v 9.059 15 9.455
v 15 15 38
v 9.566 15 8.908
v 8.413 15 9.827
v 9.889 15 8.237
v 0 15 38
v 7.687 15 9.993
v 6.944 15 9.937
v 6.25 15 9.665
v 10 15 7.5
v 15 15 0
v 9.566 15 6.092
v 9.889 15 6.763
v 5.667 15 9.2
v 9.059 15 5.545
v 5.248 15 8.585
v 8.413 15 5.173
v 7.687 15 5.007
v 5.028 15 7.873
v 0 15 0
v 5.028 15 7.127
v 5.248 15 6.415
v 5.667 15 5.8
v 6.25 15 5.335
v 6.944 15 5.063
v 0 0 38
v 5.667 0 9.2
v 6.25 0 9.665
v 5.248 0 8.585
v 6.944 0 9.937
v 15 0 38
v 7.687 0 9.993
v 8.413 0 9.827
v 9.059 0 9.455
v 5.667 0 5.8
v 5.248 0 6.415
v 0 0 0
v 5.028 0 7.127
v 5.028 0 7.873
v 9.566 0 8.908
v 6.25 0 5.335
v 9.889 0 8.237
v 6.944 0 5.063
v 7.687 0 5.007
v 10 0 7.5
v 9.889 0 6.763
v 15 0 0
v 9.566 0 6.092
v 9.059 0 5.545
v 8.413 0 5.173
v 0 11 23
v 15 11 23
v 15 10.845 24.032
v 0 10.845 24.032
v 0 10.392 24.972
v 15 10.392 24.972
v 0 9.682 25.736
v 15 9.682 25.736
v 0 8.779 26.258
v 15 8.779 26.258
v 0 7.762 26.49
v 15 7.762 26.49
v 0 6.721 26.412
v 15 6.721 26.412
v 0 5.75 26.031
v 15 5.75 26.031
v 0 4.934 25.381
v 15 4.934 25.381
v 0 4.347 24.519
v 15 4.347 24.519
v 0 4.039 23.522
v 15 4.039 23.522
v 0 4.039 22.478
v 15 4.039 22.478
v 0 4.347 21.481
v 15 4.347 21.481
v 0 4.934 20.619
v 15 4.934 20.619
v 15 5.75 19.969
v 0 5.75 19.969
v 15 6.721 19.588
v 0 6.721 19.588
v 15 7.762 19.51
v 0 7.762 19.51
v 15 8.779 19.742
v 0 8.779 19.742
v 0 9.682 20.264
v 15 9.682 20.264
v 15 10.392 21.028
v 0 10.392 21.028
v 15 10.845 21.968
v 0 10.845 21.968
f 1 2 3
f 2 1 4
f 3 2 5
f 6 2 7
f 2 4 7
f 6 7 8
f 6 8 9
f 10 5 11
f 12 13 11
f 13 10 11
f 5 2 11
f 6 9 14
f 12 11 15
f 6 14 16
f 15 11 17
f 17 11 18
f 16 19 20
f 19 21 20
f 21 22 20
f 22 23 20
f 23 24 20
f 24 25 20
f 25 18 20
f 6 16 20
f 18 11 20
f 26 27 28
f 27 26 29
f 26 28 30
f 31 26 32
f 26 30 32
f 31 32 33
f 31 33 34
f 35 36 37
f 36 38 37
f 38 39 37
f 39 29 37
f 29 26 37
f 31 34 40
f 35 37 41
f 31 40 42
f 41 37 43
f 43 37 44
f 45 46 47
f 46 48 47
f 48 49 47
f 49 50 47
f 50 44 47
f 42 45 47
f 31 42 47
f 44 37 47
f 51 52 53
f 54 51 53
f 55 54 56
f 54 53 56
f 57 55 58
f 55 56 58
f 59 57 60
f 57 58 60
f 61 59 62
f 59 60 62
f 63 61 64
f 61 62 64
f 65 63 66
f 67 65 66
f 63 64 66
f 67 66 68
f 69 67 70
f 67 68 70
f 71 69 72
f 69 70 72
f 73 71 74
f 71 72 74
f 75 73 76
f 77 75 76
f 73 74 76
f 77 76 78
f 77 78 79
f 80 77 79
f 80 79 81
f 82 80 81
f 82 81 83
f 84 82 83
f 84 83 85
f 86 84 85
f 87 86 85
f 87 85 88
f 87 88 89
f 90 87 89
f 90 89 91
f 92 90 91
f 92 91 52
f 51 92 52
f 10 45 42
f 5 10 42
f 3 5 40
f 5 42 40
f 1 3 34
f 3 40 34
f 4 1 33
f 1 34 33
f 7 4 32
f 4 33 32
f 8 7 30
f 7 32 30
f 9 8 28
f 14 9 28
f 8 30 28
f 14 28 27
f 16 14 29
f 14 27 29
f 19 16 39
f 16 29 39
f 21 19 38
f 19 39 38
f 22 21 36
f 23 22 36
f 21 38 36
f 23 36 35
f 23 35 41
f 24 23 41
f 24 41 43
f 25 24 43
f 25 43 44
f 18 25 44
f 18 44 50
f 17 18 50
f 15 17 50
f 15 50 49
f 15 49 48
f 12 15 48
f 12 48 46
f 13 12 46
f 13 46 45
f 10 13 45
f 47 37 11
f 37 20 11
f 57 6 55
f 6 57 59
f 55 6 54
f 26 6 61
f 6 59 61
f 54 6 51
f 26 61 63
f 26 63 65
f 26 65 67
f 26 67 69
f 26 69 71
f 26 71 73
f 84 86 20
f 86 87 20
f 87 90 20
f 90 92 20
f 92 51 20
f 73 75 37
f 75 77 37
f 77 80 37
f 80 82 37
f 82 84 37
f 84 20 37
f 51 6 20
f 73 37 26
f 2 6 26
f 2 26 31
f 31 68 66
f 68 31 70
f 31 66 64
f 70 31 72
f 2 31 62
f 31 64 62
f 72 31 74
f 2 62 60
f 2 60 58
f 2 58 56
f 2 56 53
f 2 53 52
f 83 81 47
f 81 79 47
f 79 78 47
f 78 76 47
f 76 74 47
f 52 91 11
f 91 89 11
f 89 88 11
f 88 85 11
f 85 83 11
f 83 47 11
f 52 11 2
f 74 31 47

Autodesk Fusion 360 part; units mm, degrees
sketch "Sketch1" plane through (0, 0, 0) normal (0, 0, 1) x (1, 0, 0)
  line L0 (0, 0) -> (15, 0)
  line L1 (15, 0) -> (15, 15)
  line L2 (15, 15) -> (0, 15)
  line L3 (0, 15) -> (0, 0)
  dimension "d1" = 15
  dimension "d2" = 15
extrude "Extrude1" add sketch "Sketch1" along normal blind 35
extrude "Extrude2" add 1 faces at (5, 10, 35) along direction (0, 0, 1) blind 3
sketch "Sketch2" plane through (15, 0, 0) normal (1, 0, 0) x (0, 1, 0)
  line L0 (0, 0) -> (15, 0)
  line L1 (15, 0) -> (15, 38)
  line L2 (15, 38) -> (0, 38)
  line L3 (0, 38) -> (0, 0)
  line L4 (0, 38) -> (15, 38)
  line L5 (15, 38) -> (15, 35.5)
  line L6 (15, 35.5) -> (0, 35.5)
  line L7 (0, 35.5) -> (0, 38)
  line L8 (0, 35.5) -> (15, 35.5)
  line L9 (15, 35.5) -> (15, 30.5)
  line L10 (15, 30.5) -> (0, 30.5)
  line L11 (0, 30.5) -> (0, 35.5)
  line L12 (0, 30.5) -> (15, 30.5)
  line L13 (15, 30.5) -> (15, 15.5)
  line L14 (15, 15.5) -> (0, 15.5)
  line L15 (0, 15.5) -> (0, 30.5)
  line L16 (0, 30.5) -> (15, 15.5)
  line L17 (15, 30.5) -> (0, 15.5)
  circle A0 centre (7.5, 23) radius 3.5
  dimension "d7" = 2.5
  dimension "d8" = 5
  dimension "d9" = 15
  dimension "d10" = 7
extrude "Extrude3" cut sketch "Sketch2" against normal blind 45 contours L16 L17 A0 | L16 L17 A0 | L16 L17 A0 | L16 L17 A0
sketch "Sketch3" plane through (0, 0, 0) normal (0, -1, 0) x (1, 0, 0)
  line L0 (0, 0) -> (15, 0)
  line L1 (15, 0) -> (15, 38)
  line L2 (15, 38) -> (0, 38)
  line L3 (0, 38) -> (0, 0)
  line L4 (0, 0) -> (15, 0)
  line L5 (15, 0) -> (15, 15)
  line L6 (15, 15) -> (0, 15)
  line L7 (0, 15) -> (0, 0)
  line L8 (0, 15) -> (15, 0)
  line L9 (15, 15) -> (0, 0)
  circle A0 centre (7.5, 7.5) radius 2.5
  dimension "d13" = 15
  dimension "d14" = 15
  dimension "d15" = 5
extrude "Extrude4" cut sketch "Sketch3" against normal blind 45 contours L8 L9 A0 | L8 L9 A0 | L8 L9 A0 | L8 L9 A0
